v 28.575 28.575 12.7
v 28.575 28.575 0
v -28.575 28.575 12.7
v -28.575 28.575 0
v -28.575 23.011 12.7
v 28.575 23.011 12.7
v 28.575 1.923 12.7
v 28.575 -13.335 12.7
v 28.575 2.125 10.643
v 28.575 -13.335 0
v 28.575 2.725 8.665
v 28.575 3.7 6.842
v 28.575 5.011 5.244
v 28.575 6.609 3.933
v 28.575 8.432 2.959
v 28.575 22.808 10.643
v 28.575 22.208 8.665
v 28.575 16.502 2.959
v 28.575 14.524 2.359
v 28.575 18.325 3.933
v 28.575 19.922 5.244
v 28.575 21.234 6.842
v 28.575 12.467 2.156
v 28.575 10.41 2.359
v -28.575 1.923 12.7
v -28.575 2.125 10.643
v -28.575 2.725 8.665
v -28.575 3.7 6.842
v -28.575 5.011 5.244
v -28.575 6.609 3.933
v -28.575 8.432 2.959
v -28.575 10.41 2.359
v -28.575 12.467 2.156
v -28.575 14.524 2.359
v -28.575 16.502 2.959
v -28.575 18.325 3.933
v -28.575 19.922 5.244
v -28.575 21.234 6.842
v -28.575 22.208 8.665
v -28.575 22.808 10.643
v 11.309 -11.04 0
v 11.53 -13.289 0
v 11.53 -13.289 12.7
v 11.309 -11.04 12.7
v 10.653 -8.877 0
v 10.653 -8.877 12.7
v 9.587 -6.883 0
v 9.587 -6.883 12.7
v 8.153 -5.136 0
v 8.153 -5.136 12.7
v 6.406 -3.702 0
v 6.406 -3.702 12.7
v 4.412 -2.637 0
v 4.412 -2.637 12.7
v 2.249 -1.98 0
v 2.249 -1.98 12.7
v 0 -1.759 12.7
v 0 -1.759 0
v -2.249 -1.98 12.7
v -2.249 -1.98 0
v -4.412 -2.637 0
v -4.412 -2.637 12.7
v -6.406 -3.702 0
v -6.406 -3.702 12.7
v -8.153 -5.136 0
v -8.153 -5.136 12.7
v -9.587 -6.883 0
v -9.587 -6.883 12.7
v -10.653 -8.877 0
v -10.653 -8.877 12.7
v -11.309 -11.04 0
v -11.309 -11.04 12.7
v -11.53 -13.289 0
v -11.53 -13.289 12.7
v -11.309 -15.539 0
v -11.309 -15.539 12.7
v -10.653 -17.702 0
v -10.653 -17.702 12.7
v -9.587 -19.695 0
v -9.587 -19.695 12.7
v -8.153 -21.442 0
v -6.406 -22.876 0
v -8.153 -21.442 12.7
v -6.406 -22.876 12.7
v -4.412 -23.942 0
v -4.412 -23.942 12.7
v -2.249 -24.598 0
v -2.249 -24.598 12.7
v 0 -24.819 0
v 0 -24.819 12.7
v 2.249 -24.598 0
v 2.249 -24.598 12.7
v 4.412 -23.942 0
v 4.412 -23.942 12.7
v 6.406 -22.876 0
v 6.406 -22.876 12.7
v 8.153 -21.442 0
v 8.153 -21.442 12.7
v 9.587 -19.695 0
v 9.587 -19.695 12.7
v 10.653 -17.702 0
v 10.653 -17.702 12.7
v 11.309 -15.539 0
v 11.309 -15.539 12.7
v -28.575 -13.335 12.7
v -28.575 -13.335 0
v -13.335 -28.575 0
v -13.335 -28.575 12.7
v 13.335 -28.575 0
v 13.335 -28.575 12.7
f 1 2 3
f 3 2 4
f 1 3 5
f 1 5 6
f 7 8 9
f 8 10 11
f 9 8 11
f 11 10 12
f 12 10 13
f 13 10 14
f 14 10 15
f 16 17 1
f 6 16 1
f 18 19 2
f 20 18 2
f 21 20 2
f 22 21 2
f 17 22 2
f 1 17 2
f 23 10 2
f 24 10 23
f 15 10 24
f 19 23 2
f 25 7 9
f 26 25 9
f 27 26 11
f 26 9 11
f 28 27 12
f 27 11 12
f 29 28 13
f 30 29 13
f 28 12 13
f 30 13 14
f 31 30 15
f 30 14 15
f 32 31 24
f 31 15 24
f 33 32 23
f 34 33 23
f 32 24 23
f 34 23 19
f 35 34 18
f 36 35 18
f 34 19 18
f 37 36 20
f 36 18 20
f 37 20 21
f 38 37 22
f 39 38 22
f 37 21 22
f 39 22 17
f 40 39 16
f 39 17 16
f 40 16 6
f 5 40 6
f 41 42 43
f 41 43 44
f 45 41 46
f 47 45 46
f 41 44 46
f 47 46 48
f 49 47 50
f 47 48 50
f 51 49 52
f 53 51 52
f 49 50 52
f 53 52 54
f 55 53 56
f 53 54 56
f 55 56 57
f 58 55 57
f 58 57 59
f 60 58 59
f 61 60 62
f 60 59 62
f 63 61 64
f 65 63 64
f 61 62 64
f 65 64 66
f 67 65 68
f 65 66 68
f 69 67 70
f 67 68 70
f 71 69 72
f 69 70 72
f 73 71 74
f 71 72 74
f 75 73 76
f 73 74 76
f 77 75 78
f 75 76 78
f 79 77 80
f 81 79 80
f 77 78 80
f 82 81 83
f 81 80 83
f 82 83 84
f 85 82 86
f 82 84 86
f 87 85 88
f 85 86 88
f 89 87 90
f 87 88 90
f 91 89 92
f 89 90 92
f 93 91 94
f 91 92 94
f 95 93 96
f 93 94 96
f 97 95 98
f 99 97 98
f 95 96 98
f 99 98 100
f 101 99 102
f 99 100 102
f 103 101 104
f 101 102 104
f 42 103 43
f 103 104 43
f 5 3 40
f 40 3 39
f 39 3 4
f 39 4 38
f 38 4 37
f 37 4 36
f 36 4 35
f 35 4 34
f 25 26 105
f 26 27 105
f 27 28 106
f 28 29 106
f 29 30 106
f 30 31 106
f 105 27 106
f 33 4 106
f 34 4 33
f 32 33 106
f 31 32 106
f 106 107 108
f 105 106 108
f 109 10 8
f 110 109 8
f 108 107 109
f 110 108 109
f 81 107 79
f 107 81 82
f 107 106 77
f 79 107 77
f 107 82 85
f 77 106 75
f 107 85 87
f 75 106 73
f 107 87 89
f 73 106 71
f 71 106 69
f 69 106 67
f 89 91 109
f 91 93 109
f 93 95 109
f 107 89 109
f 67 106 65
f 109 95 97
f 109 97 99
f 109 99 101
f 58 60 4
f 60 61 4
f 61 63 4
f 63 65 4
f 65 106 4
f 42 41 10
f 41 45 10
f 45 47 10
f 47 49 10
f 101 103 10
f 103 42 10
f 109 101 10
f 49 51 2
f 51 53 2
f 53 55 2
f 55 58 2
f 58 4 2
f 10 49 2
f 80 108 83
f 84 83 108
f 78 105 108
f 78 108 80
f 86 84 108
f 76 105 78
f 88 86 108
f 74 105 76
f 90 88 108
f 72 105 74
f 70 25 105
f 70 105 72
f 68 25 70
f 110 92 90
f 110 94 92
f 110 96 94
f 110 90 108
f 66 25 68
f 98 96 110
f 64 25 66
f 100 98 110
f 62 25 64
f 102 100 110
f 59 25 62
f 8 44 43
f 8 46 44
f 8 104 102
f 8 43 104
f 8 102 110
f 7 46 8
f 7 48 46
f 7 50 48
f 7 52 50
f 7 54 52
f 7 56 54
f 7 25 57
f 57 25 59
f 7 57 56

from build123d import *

# Parameters (mm, degrees)
F1_DEPTH = 12.7
F2_SIZE  = 15.24
F3_R     = 11.530279
F4_DEPTH = 12.7
F6_DEPTH = 63.5


with BuildPart() as f1:
    # F0 (on Top) → F1 (new body)
    with BuildSketch(Plane.XY):
        Polygon((28.575, 28.575), (0, 28.575), (-28.575, 28.575), (-28.575, 0), (-28.575, -28.575), (0, -28.575), (28.575, -28.575), (28.575, 0), align=None)
    extrude(amount=F1_DEPTH)

    # F2
    f2_edges = [f1.edges().sort_by_distance(p)[0] for p in [
        (28.575, -28.575, 6.35),
        (-28.575, -28.575, 6.35),
    ]]
    chamfer(f2_edges, length=F2_SIZE)

    # F3 (on face) → F4 (cut)
    with BuildSketch(Plane.XY.offset(12.7)):
        with Locations((0, -13.289176)):
            Circle(F3_R)
    extrude(amount=-F4_DEPTH, mode=Mode.SUBTRACT)

    # F5 (on face) → F6 (cut)
    with BuildSketch(Plane.YZ.offset(28.575)):
        with BuildLine():
            Line((23.010647, 12.7), (1.922707, 12.7))
            ThreePointArc((1.922707, 12.7), (12.466677, 2.15603), (23.010647, 12.7))
        make_face()
    extrude(amount=-F6_DEPTH, mode=Mode.SUBTRACT)


solid = f1.part
